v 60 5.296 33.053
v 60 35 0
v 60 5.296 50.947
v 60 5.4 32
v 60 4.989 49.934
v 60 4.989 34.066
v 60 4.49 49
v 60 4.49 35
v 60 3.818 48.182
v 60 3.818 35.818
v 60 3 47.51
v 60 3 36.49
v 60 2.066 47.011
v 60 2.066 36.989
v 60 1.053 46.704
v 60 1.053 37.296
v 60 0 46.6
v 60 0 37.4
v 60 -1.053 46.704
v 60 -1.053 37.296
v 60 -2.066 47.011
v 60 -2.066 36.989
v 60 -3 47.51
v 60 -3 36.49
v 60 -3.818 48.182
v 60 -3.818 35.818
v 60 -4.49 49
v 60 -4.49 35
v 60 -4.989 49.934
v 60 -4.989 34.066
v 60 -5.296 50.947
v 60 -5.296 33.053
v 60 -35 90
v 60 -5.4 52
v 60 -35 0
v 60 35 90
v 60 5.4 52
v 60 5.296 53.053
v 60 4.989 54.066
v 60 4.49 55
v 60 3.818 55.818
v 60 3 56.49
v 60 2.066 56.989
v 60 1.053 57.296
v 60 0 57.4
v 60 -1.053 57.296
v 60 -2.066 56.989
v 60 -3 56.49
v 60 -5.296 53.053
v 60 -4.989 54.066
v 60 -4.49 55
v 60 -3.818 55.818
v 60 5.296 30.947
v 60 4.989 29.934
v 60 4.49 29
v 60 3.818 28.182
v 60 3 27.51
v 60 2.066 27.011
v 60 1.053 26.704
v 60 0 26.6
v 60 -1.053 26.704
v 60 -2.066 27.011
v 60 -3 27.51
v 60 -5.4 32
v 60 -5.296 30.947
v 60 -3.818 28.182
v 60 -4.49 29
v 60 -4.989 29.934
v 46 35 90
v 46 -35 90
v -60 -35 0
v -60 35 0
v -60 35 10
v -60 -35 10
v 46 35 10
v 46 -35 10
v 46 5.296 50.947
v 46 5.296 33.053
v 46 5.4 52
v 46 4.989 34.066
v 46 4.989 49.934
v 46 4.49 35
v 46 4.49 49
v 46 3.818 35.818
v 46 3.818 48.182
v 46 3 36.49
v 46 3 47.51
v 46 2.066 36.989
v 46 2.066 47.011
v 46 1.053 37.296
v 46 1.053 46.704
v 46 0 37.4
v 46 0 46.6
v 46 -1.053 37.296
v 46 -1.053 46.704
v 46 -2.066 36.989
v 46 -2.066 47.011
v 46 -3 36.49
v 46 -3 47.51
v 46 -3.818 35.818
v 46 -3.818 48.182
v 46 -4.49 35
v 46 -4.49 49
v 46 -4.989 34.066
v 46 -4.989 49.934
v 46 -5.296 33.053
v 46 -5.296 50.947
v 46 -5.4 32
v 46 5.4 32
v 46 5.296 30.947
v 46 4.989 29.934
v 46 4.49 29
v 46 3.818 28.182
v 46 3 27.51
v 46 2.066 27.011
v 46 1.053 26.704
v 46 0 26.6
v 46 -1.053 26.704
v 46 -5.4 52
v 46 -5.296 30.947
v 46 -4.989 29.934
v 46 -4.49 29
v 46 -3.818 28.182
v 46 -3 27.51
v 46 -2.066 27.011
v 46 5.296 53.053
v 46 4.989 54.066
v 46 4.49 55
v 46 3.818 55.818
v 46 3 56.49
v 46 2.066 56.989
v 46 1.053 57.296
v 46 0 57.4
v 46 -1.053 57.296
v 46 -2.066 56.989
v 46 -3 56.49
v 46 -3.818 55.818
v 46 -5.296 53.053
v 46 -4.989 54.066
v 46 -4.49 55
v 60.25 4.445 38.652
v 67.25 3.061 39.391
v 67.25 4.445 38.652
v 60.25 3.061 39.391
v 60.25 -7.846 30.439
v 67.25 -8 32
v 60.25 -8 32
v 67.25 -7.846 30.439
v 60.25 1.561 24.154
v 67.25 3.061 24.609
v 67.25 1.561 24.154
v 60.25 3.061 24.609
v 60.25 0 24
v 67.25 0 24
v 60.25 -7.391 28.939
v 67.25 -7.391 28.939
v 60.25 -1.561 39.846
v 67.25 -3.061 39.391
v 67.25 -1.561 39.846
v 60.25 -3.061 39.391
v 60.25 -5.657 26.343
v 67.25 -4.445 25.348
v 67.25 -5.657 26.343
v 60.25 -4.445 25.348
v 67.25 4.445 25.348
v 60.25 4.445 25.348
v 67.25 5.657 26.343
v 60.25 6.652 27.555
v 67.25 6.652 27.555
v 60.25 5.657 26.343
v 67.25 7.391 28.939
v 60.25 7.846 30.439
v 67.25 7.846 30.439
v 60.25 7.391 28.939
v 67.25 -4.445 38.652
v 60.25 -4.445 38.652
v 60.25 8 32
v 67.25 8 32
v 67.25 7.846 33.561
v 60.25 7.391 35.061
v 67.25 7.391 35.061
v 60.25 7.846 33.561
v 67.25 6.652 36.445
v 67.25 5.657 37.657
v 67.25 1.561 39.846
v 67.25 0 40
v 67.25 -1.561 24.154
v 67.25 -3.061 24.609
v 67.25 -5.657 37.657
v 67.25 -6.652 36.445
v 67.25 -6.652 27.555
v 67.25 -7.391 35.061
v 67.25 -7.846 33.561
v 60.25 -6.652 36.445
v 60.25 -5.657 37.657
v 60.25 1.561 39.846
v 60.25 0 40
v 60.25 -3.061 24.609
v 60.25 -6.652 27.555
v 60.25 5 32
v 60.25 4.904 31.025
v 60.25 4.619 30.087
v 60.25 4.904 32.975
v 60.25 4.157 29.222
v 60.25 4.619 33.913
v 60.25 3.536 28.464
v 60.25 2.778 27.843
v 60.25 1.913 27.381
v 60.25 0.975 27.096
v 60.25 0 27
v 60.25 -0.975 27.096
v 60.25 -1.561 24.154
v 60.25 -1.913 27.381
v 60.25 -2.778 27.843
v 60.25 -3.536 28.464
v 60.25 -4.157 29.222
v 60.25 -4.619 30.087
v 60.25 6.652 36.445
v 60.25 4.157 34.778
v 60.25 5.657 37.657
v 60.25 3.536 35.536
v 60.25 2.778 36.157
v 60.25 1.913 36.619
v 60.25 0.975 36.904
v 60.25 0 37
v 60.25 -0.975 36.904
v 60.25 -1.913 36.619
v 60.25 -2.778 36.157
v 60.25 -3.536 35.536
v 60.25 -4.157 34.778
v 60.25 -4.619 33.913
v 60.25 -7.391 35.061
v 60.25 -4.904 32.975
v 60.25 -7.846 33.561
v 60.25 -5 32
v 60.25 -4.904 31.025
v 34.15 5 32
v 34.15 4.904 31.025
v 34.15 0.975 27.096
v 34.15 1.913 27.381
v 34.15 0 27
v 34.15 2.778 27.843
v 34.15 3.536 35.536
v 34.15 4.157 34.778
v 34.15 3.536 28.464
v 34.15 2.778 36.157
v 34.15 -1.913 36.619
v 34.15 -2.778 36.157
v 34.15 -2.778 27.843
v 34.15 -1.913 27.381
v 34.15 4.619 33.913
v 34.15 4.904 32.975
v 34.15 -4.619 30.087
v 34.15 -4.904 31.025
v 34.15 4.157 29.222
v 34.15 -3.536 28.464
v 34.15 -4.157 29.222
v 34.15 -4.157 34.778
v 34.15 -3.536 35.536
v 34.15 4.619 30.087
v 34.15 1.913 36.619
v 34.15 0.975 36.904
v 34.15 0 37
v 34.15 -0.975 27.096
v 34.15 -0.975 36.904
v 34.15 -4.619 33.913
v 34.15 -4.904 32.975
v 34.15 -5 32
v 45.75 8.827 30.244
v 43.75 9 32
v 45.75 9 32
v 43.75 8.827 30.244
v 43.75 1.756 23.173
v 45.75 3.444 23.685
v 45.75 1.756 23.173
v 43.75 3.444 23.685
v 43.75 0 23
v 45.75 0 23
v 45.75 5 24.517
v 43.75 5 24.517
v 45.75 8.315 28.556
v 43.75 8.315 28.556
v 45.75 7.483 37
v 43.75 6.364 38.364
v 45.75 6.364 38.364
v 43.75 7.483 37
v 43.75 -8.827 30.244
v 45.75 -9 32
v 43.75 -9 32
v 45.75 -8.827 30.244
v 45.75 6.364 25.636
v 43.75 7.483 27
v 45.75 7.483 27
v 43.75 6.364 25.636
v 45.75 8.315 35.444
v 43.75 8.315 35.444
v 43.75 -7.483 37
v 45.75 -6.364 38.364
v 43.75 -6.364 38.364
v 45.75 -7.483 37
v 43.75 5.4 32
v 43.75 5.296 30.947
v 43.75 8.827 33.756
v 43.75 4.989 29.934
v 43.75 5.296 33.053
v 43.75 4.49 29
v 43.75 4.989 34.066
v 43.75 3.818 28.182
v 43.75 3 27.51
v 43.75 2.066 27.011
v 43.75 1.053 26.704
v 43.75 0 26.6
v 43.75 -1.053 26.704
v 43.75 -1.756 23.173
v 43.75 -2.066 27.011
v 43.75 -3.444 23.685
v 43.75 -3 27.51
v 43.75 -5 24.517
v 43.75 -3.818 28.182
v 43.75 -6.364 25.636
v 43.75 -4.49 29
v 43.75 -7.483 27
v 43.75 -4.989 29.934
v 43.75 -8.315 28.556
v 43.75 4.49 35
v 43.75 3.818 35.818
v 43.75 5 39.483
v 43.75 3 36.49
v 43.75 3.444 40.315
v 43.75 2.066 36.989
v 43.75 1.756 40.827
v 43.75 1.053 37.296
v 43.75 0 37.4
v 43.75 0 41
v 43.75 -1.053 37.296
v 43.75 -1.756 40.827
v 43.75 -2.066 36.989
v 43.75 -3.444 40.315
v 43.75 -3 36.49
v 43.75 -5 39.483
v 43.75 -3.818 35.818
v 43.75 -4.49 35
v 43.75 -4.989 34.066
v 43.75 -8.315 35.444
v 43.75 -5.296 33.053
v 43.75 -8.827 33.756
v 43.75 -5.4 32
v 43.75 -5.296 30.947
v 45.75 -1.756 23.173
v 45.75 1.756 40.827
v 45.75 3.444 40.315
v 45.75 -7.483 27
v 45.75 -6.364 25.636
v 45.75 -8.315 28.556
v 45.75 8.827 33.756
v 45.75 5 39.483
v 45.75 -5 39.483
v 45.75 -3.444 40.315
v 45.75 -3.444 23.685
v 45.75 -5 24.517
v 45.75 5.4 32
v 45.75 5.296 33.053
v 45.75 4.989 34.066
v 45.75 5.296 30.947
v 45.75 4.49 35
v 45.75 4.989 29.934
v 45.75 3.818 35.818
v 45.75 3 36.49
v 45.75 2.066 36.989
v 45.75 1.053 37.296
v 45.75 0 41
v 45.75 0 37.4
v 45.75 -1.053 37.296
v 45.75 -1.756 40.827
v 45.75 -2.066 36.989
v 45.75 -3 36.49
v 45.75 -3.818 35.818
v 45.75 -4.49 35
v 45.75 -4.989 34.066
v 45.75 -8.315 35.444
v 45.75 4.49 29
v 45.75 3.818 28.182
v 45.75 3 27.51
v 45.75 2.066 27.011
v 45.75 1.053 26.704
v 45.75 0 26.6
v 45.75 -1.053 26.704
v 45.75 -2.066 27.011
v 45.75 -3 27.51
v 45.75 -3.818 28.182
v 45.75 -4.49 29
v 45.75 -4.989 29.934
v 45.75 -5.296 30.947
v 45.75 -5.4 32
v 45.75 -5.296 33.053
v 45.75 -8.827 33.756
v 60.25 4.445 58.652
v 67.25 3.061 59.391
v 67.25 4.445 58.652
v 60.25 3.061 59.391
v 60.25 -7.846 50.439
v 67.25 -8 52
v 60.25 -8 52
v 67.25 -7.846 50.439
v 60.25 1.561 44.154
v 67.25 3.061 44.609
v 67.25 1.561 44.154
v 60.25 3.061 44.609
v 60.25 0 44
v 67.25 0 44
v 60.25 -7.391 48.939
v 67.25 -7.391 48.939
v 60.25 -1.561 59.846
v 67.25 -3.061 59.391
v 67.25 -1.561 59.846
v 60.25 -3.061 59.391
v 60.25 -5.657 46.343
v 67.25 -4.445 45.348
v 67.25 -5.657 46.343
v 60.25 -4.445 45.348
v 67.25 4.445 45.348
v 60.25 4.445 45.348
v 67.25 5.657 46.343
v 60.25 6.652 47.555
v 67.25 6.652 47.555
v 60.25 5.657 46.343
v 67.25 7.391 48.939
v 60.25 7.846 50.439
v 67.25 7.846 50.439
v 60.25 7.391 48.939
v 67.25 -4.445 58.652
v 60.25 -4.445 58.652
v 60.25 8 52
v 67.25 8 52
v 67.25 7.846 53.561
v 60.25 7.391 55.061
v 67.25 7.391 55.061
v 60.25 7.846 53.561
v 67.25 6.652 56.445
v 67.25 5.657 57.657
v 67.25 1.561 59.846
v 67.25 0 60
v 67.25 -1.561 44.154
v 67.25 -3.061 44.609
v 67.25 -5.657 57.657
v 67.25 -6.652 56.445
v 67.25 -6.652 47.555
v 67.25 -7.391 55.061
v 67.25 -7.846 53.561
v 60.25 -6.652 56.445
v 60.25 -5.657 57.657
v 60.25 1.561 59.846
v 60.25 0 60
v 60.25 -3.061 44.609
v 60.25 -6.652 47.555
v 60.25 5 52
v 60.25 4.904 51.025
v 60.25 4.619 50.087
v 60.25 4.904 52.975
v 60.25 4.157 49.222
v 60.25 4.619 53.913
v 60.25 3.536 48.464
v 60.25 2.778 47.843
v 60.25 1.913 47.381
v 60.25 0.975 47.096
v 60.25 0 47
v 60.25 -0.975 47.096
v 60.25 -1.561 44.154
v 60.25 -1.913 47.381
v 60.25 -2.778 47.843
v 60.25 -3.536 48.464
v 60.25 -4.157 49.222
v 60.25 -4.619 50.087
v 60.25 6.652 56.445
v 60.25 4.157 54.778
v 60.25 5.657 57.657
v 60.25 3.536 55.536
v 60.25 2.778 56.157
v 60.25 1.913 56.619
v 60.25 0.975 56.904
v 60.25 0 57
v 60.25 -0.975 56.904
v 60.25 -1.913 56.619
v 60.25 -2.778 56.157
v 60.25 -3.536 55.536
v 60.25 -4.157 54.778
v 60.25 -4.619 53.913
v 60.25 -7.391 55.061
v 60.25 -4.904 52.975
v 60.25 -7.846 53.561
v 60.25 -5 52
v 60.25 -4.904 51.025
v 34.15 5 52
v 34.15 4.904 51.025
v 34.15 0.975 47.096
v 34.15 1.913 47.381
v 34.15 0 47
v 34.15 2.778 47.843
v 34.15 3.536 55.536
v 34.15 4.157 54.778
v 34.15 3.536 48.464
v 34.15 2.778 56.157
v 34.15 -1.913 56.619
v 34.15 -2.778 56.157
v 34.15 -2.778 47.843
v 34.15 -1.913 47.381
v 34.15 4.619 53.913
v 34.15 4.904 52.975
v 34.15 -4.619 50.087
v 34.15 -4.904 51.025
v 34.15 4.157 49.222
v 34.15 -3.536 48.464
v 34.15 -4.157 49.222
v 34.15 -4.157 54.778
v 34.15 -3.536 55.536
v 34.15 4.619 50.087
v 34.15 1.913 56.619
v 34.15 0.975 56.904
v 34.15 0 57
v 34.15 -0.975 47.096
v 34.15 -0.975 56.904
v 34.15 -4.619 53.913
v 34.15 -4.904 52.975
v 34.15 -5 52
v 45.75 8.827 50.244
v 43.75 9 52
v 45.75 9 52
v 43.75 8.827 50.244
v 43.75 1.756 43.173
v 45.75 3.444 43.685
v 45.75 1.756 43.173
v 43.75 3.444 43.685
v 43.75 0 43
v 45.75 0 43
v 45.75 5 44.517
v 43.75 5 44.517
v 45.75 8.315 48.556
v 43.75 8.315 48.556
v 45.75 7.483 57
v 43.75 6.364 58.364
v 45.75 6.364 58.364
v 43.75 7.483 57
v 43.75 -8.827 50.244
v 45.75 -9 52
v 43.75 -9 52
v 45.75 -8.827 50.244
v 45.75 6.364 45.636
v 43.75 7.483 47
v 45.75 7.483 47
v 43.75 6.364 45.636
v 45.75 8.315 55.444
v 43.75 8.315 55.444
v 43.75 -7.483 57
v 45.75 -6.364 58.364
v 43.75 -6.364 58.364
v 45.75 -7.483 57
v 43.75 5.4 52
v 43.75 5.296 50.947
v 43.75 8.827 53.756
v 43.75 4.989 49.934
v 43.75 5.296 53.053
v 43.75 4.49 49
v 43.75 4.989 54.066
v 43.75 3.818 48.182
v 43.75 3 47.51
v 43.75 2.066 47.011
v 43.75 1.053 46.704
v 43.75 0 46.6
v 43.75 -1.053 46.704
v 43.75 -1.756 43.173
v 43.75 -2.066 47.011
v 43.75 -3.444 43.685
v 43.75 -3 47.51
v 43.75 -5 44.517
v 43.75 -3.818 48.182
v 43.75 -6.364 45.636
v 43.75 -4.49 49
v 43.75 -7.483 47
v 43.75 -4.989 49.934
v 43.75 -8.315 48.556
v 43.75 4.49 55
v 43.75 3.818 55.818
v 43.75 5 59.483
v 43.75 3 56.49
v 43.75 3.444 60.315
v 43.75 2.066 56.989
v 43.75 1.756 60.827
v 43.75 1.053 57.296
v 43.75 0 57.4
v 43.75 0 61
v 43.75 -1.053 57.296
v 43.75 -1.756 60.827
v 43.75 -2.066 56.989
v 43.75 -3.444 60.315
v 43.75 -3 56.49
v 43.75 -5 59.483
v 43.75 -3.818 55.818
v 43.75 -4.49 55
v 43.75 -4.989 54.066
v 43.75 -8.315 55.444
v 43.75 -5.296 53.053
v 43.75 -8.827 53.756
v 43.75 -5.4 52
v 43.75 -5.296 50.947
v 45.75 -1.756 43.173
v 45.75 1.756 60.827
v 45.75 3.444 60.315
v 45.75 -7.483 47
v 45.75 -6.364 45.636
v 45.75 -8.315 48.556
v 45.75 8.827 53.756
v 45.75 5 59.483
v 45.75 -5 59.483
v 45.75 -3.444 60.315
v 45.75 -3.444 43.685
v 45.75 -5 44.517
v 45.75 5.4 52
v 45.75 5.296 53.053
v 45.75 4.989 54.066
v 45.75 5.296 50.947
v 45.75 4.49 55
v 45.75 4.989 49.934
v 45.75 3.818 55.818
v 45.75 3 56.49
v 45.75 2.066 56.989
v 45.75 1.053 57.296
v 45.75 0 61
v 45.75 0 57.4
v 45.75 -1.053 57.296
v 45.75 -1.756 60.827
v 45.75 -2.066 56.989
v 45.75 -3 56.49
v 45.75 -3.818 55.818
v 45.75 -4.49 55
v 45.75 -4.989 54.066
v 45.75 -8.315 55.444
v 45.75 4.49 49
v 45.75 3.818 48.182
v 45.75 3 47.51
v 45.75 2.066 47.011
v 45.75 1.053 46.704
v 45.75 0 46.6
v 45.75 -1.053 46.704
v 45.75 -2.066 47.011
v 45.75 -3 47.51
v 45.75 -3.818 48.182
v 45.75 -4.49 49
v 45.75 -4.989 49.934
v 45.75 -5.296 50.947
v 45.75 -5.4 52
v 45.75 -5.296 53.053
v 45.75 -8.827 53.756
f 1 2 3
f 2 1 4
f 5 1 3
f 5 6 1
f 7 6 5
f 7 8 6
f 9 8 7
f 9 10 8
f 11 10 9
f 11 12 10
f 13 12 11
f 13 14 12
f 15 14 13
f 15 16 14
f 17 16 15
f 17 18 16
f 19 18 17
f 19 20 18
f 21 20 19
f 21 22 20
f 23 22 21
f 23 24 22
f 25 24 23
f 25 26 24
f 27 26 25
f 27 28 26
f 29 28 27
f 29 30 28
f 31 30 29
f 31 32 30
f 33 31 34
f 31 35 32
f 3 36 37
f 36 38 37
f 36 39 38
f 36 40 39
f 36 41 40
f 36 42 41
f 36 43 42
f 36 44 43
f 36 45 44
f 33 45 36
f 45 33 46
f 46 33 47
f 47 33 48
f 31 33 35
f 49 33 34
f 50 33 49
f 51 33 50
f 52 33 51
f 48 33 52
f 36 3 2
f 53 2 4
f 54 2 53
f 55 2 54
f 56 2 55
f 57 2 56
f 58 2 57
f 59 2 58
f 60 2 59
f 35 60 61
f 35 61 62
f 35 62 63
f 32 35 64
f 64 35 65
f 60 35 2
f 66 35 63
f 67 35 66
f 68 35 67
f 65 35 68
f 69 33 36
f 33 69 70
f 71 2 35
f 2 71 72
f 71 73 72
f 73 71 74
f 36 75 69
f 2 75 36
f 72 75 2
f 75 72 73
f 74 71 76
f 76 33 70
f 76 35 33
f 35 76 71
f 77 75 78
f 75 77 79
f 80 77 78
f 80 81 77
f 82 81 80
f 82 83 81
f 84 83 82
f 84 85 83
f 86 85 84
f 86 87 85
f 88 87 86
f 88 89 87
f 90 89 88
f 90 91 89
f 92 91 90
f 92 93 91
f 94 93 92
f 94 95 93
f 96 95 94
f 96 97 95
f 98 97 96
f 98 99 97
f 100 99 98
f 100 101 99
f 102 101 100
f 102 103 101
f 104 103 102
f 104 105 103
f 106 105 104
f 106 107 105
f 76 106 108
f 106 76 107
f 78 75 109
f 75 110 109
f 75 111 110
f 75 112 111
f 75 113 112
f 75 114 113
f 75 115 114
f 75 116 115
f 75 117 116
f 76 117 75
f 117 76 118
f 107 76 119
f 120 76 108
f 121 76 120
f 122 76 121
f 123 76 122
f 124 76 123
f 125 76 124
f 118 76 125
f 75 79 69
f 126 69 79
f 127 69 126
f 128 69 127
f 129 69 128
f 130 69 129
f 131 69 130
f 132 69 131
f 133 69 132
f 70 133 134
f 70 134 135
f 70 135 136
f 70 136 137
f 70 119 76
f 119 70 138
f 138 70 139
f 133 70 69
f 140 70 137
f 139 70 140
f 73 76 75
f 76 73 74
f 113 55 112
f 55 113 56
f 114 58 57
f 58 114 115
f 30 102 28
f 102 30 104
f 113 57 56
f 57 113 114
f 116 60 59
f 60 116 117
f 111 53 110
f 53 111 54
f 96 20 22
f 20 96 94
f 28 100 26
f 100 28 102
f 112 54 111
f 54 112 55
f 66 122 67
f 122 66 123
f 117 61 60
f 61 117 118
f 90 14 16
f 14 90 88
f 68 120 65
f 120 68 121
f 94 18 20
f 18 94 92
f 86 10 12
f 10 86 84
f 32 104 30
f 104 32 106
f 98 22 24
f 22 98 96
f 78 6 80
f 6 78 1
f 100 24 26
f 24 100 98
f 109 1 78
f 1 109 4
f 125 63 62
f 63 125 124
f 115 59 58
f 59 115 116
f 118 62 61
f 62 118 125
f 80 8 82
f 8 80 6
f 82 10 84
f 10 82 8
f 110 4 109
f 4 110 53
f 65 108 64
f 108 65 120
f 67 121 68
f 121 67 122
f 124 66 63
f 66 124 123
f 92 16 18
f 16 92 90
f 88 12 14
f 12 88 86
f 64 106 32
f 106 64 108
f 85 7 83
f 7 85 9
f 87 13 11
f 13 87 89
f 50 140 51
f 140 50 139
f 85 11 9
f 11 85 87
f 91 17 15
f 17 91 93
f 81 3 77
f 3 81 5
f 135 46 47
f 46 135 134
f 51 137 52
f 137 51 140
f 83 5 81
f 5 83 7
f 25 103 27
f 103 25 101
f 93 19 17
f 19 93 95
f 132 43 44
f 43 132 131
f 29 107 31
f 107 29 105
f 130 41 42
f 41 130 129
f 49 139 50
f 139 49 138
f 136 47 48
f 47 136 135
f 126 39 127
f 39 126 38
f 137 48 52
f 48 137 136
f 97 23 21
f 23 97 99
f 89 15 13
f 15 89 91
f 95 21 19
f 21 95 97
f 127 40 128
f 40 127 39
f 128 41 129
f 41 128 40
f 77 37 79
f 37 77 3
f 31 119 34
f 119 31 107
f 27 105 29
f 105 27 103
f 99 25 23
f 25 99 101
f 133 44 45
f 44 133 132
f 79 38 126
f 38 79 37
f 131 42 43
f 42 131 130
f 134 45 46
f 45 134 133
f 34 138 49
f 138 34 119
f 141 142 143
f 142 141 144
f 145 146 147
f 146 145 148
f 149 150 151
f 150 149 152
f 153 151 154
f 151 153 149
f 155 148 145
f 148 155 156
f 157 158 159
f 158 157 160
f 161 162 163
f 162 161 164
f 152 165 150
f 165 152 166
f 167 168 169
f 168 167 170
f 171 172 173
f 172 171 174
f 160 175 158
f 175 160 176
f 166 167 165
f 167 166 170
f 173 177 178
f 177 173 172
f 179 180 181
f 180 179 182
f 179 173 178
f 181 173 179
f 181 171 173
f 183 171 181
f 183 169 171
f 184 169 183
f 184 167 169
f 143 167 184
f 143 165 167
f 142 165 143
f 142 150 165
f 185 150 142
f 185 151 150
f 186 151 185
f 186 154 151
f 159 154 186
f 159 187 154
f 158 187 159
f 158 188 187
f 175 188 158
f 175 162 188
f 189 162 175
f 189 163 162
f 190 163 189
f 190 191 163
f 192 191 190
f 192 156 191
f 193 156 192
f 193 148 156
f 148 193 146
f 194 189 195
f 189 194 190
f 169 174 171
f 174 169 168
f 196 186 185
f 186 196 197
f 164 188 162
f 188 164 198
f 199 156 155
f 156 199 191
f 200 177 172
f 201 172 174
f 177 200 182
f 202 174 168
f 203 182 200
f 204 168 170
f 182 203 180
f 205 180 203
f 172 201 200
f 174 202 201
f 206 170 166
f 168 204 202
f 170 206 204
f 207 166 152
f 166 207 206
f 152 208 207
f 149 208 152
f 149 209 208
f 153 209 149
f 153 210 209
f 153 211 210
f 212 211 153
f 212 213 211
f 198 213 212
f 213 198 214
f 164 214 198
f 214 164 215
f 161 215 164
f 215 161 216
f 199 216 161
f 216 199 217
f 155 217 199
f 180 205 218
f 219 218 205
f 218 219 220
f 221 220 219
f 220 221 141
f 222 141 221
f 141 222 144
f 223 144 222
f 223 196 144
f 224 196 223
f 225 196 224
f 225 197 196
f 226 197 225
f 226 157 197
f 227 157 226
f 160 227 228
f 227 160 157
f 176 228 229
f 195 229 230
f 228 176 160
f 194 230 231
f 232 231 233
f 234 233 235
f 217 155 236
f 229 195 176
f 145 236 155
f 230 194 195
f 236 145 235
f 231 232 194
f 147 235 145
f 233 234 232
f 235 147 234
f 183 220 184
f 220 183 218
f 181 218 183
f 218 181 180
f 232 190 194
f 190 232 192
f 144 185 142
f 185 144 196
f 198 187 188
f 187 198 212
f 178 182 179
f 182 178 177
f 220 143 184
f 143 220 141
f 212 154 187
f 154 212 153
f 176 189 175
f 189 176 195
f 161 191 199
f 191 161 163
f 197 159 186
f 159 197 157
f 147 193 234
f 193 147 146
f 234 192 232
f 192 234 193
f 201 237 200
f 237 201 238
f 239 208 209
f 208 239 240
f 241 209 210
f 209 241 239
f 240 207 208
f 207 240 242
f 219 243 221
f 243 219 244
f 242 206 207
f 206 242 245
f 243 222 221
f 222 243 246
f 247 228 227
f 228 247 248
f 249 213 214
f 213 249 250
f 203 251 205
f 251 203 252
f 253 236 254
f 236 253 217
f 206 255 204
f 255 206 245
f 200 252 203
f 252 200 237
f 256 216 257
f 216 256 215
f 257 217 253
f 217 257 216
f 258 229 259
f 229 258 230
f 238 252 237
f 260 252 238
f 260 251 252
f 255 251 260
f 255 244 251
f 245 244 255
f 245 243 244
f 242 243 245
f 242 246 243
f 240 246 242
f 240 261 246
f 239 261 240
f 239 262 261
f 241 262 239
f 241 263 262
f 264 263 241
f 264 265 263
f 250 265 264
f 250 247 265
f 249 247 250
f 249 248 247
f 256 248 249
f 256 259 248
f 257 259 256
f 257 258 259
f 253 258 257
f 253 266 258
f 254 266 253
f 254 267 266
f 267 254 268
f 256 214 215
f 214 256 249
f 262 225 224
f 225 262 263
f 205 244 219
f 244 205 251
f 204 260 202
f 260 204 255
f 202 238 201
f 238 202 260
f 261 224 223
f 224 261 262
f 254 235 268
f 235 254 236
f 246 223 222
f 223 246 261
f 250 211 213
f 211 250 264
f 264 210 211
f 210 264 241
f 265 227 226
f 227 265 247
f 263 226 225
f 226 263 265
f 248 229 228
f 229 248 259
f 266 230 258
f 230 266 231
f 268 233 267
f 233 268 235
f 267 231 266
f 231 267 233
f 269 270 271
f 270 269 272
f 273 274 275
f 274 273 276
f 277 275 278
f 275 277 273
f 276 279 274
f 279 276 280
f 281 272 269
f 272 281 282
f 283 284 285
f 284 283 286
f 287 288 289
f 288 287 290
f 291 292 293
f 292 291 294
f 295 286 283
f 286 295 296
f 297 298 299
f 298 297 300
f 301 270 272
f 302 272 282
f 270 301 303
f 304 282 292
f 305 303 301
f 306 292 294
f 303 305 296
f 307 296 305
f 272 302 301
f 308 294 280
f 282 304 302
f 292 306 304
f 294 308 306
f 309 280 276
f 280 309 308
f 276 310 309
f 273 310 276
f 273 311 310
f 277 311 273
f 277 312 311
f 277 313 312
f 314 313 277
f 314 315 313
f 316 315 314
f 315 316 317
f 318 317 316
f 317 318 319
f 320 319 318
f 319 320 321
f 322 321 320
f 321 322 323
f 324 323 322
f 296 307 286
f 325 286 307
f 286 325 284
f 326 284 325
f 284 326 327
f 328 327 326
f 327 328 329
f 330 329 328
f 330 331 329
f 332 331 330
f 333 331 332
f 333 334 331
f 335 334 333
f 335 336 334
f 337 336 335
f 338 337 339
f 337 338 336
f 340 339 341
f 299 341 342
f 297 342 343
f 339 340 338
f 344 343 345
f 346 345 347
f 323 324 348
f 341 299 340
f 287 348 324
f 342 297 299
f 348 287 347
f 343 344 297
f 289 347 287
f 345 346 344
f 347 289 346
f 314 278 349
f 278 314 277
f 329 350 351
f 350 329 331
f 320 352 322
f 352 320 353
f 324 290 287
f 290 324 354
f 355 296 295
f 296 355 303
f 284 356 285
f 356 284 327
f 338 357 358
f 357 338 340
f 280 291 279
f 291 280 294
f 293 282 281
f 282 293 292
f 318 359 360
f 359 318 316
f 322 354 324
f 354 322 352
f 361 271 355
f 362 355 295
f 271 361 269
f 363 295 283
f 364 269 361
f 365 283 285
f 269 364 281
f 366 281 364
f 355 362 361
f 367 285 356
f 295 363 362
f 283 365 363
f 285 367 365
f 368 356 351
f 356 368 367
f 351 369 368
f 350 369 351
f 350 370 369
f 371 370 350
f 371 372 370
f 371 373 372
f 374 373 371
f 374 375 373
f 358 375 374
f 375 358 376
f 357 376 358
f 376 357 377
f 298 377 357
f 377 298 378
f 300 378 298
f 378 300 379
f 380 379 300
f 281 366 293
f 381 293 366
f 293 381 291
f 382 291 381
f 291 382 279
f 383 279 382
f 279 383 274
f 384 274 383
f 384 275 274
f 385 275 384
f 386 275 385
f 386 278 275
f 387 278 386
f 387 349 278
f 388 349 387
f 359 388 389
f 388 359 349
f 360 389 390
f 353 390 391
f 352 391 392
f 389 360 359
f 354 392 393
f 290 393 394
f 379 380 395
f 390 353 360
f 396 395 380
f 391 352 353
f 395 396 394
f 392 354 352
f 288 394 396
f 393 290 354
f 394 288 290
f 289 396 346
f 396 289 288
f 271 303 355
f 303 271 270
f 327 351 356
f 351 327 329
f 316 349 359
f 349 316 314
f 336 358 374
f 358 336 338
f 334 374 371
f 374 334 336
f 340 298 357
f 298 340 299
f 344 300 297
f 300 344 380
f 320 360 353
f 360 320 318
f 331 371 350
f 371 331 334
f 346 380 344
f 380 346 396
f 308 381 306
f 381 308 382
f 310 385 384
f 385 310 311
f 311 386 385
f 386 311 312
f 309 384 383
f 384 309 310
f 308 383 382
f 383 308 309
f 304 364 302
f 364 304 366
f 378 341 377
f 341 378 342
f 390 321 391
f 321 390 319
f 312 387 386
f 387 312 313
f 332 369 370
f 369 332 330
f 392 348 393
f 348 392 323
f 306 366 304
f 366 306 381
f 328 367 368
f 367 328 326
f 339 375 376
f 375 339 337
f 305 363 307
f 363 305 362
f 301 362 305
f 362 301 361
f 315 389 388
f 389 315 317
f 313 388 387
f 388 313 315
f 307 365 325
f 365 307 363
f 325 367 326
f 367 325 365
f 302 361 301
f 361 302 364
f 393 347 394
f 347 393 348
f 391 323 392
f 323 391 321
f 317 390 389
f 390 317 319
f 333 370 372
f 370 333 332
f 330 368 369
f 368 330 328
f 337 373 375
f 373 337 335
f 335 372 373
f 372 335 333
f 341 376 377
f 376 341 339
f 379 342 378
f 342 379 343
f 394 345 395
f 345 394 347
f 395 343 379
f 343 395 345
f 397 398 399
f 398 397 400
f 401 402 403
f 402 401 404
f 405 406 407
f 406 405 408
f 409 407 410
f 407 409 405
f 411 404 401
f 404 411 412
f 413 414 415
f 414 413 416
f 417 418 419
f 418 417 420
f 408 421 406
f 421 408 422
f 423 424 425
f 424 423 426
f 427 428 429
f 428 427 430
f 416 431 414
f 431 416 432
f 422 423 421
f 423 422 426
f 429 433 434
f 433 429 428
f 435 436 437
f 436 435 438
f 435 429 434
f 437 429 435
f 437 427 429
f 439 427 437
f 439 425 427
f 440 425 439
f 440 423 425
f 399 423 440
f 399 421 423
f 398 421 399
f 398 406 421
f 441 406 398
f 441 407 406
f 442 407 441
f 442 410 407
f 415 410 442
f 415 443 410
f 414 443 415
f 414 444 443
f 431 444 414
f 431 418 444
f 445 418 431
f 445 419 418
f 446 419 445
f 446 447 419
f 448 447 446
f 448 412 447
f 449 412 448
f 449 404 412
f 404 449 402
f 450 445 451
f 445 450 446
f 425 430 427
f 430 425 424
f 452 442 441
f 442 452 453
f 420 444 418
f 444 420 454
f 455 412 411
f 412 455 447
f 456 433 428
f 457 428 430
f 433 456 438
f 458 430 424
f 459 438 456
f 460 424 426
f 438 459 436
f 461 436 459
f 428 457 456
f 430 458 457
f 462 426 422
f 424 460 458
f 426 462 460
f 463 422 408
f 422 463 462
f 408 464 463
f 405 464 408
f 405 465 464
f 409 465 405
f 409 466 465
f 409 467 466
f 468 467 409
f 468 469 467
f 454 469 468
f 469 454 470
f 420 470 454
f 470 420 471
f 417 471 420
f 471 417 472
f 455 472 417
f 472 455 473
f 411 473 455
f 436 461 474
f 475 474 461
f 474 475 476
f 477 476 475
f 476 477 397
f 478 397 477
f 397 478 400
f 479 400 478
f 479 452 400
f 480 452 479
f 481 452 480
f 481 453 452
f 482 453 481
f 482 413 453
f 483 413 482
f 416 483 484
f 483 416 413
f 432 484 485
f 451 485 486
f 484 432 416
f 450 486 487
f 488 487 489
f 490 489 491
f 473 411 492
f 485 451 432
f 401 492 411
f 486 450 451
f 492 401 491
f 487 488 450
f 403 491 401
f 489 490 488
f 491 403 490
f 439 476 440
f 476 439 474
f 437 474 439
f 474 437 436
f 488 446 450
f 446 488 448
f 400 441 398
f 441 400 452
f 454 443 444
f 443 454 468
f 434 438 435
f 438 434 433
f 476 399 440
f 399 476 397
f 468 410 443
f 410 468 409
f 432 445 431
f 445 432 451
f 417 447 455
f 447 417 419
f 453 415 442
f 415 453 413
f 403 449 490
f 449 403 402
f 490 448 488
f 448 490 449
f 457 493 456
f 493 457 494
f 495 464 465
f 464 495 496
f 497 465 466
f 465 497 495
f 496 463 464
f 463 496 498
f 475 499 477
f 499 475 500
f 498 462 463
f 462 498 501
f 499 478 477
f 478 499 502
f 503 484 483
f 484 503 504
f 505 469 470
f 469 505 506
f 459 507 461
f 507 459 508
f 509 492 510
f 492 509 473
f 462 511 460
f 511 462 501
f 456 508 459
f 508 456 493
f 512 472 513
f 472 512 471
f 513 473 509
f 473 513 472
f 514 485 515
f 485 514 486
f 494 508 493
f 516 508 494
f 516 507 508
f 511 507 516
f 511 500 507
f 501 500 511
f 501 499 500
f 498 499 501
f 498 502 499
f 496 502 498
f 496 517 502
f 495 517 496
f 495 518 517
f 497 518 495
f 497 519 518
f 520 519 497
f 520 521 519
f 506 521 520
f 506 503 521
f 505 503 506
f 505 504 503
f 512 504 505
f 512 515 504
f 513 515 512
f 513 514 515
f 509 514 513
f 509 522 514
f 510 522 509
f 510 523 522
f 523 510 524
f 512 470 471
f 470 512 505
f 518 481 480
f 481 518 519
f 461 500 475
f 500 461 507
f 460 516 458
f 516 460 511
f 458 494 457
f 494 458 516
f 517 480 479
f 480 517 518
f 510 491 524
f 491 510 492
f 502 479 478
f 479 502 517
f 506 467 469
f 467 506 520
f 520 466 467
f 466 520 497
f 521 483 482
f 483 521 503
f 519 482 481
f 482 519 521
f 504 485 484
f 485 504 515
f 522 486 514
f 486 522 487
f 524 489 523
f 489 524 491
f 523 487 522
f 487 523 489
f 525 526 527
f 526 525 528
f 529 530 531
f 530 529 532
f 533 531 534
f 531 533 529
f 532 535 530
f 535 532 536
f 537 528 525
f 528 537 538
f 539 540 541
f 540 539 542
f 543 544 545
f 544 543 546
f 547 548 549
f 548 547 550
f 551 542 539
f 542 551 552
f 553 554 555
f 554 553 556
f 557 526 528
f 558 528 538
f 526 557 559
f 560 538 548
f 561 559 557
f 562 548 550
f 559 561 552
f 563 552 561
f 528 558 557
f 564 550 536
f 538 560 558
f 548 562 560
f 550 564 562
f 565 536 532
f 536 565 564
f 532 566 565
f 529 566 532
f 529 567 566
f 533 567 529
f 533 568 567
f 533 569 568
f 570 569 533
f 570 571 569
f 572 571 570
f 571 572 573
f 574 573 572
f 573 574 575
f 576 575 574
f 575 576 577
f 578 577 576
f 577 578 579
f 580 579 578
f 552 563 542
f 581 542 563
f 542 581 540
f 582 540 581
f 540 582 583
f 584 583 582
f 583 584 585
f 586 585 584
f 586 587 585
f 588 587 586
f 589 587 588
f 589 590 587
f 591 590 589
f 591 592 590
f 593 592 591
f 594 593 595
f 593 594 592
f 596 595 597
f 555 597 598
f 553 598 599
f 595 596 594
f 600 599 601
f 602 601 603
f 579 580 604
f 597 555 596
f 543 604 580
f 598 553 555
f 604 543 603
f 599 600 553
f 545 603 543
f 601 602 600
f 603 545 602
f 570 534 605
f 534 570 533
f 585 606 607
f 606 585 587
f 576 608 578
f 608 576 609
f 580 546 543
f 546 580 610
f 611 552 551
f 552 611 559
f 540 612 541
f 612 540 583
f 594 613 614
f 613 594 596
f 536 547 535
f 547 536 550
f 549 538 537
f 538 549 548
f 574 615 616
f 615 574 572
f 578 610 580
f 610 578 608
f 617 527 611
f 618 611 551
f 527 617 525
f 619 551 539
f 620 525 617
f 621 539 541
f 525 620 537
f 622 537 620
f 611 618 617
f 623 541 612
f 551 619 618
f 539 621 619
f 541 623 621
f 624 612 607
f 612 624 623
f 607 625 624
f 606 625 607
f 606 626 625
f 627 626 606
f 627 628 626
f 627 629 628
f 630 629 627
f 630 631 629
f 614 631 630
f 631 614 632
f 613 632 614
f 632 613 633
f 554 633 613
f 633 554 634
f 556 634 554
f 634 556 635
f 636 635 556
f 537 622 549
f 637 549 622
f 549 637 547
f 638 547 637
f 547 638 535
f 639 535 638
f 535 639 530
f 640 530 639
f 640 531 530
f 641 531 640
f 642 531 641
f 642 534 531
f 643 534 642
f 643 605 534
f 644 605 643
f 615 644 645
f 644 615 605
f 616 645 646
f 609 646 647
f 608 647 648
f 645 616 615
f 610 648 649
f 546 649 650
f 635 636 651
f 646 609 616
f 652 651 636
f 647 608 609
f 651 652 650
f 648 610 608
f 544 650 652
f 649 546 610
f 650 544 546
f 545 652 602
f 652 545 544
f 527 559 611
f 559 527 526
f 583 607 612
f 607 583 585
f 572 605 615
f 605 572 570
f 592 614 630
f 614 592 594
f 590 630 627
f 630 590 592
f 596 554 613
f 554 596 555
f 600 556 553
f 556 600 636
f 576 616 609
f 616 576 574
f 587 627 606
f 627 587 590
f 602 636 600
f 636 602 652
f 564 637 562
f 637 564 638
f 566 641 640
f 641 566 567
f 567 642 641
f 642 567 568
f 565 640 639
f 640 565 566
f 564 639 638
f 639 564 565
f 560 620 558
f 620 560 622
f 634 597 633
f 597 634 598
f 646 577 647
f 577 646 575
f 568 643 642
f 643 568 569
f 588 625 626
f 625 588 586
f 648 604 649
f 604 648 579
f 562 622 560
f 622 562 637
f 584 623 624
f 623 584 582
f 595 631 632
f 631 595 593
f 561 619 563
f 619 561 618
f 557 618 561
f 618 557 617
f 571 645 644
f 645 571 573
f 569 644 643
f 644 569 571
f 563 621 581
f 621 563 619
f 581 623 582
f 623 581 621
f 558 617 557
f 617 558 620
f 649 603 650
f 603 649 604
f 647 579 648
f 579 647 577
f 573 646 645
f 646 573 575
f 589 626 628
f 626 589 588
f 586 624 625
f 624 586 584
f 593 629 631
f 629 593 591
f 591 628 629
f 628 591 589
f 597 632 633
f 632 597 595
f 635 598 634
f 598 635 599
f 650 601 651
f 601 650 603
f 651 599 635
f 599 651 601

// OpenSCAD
$fn = 32;

// ------------------------------------------------------------------------
// Bolted bracket: 120 x 70 mm bracket with 2 bolt joints
// Every part is its own module, assembly() places them once.
// ------------------------------------------------------------------------

// --- part 1 ---
module bracket() {
  difference() {
    translate([-60, -35, 0]) cube([120, 70, 90]);
    translate([-61, -36, 10]) cube([107, 72, 81]);
    translate([53, 0, 32]) rotate([0, 90, 0]) cylinder(h = 16, d = 10.8, center = true);
    translate([53, 0, 52]) rotate([0, 90, 0]) cylinder(h = 16, d = 10.8, center = true);
  }
}

// --- part 2 ---
module bolt1() {
  cylinder(h = 7, d = 16);
  translate([0, 0, -26.1]) cylinder(h = 26.1, d = 10);
}

// --- part 3 ---
module washer1() {
  difference() {
      translate([0, 0, 0]) cylinder(h = 2, d = 18);
      translate([0, 0, -1]) cylinder(h = 4, d = 10.8);
    }
}

// --- part 4 ---
module bolt2() {
  cylinder(h = 7, d = 16);
  translate([0, 0, -26.1]) cylinder(h = 26.1, d = 10);
}

// --- part 5 ---
module washer2() {
  difference() {
      translate([0, 0, 0]) cylinder(h = 2, d = 18);
      translate([0, 0, -1]) cylinder(h = 4, d = 10.8);
    }
}

// --- assembly ---
module assembly() {
  translate([0, 0, 0]) rotate([0, 0, 0]) bracket();
  translate([60.25, 0, 32]) rotate([0, 90, 0]) bolt1();
  translate([43.75, 0, 32]) rotate([0, 90, 0]) washer1();
  translate([60.25, 0, 52]) rotate([0, 90, 0]) bolt2();
  translate([43.75, 0, 52]) rotate([0, 90, 0]) washer2();
}

assembly();
